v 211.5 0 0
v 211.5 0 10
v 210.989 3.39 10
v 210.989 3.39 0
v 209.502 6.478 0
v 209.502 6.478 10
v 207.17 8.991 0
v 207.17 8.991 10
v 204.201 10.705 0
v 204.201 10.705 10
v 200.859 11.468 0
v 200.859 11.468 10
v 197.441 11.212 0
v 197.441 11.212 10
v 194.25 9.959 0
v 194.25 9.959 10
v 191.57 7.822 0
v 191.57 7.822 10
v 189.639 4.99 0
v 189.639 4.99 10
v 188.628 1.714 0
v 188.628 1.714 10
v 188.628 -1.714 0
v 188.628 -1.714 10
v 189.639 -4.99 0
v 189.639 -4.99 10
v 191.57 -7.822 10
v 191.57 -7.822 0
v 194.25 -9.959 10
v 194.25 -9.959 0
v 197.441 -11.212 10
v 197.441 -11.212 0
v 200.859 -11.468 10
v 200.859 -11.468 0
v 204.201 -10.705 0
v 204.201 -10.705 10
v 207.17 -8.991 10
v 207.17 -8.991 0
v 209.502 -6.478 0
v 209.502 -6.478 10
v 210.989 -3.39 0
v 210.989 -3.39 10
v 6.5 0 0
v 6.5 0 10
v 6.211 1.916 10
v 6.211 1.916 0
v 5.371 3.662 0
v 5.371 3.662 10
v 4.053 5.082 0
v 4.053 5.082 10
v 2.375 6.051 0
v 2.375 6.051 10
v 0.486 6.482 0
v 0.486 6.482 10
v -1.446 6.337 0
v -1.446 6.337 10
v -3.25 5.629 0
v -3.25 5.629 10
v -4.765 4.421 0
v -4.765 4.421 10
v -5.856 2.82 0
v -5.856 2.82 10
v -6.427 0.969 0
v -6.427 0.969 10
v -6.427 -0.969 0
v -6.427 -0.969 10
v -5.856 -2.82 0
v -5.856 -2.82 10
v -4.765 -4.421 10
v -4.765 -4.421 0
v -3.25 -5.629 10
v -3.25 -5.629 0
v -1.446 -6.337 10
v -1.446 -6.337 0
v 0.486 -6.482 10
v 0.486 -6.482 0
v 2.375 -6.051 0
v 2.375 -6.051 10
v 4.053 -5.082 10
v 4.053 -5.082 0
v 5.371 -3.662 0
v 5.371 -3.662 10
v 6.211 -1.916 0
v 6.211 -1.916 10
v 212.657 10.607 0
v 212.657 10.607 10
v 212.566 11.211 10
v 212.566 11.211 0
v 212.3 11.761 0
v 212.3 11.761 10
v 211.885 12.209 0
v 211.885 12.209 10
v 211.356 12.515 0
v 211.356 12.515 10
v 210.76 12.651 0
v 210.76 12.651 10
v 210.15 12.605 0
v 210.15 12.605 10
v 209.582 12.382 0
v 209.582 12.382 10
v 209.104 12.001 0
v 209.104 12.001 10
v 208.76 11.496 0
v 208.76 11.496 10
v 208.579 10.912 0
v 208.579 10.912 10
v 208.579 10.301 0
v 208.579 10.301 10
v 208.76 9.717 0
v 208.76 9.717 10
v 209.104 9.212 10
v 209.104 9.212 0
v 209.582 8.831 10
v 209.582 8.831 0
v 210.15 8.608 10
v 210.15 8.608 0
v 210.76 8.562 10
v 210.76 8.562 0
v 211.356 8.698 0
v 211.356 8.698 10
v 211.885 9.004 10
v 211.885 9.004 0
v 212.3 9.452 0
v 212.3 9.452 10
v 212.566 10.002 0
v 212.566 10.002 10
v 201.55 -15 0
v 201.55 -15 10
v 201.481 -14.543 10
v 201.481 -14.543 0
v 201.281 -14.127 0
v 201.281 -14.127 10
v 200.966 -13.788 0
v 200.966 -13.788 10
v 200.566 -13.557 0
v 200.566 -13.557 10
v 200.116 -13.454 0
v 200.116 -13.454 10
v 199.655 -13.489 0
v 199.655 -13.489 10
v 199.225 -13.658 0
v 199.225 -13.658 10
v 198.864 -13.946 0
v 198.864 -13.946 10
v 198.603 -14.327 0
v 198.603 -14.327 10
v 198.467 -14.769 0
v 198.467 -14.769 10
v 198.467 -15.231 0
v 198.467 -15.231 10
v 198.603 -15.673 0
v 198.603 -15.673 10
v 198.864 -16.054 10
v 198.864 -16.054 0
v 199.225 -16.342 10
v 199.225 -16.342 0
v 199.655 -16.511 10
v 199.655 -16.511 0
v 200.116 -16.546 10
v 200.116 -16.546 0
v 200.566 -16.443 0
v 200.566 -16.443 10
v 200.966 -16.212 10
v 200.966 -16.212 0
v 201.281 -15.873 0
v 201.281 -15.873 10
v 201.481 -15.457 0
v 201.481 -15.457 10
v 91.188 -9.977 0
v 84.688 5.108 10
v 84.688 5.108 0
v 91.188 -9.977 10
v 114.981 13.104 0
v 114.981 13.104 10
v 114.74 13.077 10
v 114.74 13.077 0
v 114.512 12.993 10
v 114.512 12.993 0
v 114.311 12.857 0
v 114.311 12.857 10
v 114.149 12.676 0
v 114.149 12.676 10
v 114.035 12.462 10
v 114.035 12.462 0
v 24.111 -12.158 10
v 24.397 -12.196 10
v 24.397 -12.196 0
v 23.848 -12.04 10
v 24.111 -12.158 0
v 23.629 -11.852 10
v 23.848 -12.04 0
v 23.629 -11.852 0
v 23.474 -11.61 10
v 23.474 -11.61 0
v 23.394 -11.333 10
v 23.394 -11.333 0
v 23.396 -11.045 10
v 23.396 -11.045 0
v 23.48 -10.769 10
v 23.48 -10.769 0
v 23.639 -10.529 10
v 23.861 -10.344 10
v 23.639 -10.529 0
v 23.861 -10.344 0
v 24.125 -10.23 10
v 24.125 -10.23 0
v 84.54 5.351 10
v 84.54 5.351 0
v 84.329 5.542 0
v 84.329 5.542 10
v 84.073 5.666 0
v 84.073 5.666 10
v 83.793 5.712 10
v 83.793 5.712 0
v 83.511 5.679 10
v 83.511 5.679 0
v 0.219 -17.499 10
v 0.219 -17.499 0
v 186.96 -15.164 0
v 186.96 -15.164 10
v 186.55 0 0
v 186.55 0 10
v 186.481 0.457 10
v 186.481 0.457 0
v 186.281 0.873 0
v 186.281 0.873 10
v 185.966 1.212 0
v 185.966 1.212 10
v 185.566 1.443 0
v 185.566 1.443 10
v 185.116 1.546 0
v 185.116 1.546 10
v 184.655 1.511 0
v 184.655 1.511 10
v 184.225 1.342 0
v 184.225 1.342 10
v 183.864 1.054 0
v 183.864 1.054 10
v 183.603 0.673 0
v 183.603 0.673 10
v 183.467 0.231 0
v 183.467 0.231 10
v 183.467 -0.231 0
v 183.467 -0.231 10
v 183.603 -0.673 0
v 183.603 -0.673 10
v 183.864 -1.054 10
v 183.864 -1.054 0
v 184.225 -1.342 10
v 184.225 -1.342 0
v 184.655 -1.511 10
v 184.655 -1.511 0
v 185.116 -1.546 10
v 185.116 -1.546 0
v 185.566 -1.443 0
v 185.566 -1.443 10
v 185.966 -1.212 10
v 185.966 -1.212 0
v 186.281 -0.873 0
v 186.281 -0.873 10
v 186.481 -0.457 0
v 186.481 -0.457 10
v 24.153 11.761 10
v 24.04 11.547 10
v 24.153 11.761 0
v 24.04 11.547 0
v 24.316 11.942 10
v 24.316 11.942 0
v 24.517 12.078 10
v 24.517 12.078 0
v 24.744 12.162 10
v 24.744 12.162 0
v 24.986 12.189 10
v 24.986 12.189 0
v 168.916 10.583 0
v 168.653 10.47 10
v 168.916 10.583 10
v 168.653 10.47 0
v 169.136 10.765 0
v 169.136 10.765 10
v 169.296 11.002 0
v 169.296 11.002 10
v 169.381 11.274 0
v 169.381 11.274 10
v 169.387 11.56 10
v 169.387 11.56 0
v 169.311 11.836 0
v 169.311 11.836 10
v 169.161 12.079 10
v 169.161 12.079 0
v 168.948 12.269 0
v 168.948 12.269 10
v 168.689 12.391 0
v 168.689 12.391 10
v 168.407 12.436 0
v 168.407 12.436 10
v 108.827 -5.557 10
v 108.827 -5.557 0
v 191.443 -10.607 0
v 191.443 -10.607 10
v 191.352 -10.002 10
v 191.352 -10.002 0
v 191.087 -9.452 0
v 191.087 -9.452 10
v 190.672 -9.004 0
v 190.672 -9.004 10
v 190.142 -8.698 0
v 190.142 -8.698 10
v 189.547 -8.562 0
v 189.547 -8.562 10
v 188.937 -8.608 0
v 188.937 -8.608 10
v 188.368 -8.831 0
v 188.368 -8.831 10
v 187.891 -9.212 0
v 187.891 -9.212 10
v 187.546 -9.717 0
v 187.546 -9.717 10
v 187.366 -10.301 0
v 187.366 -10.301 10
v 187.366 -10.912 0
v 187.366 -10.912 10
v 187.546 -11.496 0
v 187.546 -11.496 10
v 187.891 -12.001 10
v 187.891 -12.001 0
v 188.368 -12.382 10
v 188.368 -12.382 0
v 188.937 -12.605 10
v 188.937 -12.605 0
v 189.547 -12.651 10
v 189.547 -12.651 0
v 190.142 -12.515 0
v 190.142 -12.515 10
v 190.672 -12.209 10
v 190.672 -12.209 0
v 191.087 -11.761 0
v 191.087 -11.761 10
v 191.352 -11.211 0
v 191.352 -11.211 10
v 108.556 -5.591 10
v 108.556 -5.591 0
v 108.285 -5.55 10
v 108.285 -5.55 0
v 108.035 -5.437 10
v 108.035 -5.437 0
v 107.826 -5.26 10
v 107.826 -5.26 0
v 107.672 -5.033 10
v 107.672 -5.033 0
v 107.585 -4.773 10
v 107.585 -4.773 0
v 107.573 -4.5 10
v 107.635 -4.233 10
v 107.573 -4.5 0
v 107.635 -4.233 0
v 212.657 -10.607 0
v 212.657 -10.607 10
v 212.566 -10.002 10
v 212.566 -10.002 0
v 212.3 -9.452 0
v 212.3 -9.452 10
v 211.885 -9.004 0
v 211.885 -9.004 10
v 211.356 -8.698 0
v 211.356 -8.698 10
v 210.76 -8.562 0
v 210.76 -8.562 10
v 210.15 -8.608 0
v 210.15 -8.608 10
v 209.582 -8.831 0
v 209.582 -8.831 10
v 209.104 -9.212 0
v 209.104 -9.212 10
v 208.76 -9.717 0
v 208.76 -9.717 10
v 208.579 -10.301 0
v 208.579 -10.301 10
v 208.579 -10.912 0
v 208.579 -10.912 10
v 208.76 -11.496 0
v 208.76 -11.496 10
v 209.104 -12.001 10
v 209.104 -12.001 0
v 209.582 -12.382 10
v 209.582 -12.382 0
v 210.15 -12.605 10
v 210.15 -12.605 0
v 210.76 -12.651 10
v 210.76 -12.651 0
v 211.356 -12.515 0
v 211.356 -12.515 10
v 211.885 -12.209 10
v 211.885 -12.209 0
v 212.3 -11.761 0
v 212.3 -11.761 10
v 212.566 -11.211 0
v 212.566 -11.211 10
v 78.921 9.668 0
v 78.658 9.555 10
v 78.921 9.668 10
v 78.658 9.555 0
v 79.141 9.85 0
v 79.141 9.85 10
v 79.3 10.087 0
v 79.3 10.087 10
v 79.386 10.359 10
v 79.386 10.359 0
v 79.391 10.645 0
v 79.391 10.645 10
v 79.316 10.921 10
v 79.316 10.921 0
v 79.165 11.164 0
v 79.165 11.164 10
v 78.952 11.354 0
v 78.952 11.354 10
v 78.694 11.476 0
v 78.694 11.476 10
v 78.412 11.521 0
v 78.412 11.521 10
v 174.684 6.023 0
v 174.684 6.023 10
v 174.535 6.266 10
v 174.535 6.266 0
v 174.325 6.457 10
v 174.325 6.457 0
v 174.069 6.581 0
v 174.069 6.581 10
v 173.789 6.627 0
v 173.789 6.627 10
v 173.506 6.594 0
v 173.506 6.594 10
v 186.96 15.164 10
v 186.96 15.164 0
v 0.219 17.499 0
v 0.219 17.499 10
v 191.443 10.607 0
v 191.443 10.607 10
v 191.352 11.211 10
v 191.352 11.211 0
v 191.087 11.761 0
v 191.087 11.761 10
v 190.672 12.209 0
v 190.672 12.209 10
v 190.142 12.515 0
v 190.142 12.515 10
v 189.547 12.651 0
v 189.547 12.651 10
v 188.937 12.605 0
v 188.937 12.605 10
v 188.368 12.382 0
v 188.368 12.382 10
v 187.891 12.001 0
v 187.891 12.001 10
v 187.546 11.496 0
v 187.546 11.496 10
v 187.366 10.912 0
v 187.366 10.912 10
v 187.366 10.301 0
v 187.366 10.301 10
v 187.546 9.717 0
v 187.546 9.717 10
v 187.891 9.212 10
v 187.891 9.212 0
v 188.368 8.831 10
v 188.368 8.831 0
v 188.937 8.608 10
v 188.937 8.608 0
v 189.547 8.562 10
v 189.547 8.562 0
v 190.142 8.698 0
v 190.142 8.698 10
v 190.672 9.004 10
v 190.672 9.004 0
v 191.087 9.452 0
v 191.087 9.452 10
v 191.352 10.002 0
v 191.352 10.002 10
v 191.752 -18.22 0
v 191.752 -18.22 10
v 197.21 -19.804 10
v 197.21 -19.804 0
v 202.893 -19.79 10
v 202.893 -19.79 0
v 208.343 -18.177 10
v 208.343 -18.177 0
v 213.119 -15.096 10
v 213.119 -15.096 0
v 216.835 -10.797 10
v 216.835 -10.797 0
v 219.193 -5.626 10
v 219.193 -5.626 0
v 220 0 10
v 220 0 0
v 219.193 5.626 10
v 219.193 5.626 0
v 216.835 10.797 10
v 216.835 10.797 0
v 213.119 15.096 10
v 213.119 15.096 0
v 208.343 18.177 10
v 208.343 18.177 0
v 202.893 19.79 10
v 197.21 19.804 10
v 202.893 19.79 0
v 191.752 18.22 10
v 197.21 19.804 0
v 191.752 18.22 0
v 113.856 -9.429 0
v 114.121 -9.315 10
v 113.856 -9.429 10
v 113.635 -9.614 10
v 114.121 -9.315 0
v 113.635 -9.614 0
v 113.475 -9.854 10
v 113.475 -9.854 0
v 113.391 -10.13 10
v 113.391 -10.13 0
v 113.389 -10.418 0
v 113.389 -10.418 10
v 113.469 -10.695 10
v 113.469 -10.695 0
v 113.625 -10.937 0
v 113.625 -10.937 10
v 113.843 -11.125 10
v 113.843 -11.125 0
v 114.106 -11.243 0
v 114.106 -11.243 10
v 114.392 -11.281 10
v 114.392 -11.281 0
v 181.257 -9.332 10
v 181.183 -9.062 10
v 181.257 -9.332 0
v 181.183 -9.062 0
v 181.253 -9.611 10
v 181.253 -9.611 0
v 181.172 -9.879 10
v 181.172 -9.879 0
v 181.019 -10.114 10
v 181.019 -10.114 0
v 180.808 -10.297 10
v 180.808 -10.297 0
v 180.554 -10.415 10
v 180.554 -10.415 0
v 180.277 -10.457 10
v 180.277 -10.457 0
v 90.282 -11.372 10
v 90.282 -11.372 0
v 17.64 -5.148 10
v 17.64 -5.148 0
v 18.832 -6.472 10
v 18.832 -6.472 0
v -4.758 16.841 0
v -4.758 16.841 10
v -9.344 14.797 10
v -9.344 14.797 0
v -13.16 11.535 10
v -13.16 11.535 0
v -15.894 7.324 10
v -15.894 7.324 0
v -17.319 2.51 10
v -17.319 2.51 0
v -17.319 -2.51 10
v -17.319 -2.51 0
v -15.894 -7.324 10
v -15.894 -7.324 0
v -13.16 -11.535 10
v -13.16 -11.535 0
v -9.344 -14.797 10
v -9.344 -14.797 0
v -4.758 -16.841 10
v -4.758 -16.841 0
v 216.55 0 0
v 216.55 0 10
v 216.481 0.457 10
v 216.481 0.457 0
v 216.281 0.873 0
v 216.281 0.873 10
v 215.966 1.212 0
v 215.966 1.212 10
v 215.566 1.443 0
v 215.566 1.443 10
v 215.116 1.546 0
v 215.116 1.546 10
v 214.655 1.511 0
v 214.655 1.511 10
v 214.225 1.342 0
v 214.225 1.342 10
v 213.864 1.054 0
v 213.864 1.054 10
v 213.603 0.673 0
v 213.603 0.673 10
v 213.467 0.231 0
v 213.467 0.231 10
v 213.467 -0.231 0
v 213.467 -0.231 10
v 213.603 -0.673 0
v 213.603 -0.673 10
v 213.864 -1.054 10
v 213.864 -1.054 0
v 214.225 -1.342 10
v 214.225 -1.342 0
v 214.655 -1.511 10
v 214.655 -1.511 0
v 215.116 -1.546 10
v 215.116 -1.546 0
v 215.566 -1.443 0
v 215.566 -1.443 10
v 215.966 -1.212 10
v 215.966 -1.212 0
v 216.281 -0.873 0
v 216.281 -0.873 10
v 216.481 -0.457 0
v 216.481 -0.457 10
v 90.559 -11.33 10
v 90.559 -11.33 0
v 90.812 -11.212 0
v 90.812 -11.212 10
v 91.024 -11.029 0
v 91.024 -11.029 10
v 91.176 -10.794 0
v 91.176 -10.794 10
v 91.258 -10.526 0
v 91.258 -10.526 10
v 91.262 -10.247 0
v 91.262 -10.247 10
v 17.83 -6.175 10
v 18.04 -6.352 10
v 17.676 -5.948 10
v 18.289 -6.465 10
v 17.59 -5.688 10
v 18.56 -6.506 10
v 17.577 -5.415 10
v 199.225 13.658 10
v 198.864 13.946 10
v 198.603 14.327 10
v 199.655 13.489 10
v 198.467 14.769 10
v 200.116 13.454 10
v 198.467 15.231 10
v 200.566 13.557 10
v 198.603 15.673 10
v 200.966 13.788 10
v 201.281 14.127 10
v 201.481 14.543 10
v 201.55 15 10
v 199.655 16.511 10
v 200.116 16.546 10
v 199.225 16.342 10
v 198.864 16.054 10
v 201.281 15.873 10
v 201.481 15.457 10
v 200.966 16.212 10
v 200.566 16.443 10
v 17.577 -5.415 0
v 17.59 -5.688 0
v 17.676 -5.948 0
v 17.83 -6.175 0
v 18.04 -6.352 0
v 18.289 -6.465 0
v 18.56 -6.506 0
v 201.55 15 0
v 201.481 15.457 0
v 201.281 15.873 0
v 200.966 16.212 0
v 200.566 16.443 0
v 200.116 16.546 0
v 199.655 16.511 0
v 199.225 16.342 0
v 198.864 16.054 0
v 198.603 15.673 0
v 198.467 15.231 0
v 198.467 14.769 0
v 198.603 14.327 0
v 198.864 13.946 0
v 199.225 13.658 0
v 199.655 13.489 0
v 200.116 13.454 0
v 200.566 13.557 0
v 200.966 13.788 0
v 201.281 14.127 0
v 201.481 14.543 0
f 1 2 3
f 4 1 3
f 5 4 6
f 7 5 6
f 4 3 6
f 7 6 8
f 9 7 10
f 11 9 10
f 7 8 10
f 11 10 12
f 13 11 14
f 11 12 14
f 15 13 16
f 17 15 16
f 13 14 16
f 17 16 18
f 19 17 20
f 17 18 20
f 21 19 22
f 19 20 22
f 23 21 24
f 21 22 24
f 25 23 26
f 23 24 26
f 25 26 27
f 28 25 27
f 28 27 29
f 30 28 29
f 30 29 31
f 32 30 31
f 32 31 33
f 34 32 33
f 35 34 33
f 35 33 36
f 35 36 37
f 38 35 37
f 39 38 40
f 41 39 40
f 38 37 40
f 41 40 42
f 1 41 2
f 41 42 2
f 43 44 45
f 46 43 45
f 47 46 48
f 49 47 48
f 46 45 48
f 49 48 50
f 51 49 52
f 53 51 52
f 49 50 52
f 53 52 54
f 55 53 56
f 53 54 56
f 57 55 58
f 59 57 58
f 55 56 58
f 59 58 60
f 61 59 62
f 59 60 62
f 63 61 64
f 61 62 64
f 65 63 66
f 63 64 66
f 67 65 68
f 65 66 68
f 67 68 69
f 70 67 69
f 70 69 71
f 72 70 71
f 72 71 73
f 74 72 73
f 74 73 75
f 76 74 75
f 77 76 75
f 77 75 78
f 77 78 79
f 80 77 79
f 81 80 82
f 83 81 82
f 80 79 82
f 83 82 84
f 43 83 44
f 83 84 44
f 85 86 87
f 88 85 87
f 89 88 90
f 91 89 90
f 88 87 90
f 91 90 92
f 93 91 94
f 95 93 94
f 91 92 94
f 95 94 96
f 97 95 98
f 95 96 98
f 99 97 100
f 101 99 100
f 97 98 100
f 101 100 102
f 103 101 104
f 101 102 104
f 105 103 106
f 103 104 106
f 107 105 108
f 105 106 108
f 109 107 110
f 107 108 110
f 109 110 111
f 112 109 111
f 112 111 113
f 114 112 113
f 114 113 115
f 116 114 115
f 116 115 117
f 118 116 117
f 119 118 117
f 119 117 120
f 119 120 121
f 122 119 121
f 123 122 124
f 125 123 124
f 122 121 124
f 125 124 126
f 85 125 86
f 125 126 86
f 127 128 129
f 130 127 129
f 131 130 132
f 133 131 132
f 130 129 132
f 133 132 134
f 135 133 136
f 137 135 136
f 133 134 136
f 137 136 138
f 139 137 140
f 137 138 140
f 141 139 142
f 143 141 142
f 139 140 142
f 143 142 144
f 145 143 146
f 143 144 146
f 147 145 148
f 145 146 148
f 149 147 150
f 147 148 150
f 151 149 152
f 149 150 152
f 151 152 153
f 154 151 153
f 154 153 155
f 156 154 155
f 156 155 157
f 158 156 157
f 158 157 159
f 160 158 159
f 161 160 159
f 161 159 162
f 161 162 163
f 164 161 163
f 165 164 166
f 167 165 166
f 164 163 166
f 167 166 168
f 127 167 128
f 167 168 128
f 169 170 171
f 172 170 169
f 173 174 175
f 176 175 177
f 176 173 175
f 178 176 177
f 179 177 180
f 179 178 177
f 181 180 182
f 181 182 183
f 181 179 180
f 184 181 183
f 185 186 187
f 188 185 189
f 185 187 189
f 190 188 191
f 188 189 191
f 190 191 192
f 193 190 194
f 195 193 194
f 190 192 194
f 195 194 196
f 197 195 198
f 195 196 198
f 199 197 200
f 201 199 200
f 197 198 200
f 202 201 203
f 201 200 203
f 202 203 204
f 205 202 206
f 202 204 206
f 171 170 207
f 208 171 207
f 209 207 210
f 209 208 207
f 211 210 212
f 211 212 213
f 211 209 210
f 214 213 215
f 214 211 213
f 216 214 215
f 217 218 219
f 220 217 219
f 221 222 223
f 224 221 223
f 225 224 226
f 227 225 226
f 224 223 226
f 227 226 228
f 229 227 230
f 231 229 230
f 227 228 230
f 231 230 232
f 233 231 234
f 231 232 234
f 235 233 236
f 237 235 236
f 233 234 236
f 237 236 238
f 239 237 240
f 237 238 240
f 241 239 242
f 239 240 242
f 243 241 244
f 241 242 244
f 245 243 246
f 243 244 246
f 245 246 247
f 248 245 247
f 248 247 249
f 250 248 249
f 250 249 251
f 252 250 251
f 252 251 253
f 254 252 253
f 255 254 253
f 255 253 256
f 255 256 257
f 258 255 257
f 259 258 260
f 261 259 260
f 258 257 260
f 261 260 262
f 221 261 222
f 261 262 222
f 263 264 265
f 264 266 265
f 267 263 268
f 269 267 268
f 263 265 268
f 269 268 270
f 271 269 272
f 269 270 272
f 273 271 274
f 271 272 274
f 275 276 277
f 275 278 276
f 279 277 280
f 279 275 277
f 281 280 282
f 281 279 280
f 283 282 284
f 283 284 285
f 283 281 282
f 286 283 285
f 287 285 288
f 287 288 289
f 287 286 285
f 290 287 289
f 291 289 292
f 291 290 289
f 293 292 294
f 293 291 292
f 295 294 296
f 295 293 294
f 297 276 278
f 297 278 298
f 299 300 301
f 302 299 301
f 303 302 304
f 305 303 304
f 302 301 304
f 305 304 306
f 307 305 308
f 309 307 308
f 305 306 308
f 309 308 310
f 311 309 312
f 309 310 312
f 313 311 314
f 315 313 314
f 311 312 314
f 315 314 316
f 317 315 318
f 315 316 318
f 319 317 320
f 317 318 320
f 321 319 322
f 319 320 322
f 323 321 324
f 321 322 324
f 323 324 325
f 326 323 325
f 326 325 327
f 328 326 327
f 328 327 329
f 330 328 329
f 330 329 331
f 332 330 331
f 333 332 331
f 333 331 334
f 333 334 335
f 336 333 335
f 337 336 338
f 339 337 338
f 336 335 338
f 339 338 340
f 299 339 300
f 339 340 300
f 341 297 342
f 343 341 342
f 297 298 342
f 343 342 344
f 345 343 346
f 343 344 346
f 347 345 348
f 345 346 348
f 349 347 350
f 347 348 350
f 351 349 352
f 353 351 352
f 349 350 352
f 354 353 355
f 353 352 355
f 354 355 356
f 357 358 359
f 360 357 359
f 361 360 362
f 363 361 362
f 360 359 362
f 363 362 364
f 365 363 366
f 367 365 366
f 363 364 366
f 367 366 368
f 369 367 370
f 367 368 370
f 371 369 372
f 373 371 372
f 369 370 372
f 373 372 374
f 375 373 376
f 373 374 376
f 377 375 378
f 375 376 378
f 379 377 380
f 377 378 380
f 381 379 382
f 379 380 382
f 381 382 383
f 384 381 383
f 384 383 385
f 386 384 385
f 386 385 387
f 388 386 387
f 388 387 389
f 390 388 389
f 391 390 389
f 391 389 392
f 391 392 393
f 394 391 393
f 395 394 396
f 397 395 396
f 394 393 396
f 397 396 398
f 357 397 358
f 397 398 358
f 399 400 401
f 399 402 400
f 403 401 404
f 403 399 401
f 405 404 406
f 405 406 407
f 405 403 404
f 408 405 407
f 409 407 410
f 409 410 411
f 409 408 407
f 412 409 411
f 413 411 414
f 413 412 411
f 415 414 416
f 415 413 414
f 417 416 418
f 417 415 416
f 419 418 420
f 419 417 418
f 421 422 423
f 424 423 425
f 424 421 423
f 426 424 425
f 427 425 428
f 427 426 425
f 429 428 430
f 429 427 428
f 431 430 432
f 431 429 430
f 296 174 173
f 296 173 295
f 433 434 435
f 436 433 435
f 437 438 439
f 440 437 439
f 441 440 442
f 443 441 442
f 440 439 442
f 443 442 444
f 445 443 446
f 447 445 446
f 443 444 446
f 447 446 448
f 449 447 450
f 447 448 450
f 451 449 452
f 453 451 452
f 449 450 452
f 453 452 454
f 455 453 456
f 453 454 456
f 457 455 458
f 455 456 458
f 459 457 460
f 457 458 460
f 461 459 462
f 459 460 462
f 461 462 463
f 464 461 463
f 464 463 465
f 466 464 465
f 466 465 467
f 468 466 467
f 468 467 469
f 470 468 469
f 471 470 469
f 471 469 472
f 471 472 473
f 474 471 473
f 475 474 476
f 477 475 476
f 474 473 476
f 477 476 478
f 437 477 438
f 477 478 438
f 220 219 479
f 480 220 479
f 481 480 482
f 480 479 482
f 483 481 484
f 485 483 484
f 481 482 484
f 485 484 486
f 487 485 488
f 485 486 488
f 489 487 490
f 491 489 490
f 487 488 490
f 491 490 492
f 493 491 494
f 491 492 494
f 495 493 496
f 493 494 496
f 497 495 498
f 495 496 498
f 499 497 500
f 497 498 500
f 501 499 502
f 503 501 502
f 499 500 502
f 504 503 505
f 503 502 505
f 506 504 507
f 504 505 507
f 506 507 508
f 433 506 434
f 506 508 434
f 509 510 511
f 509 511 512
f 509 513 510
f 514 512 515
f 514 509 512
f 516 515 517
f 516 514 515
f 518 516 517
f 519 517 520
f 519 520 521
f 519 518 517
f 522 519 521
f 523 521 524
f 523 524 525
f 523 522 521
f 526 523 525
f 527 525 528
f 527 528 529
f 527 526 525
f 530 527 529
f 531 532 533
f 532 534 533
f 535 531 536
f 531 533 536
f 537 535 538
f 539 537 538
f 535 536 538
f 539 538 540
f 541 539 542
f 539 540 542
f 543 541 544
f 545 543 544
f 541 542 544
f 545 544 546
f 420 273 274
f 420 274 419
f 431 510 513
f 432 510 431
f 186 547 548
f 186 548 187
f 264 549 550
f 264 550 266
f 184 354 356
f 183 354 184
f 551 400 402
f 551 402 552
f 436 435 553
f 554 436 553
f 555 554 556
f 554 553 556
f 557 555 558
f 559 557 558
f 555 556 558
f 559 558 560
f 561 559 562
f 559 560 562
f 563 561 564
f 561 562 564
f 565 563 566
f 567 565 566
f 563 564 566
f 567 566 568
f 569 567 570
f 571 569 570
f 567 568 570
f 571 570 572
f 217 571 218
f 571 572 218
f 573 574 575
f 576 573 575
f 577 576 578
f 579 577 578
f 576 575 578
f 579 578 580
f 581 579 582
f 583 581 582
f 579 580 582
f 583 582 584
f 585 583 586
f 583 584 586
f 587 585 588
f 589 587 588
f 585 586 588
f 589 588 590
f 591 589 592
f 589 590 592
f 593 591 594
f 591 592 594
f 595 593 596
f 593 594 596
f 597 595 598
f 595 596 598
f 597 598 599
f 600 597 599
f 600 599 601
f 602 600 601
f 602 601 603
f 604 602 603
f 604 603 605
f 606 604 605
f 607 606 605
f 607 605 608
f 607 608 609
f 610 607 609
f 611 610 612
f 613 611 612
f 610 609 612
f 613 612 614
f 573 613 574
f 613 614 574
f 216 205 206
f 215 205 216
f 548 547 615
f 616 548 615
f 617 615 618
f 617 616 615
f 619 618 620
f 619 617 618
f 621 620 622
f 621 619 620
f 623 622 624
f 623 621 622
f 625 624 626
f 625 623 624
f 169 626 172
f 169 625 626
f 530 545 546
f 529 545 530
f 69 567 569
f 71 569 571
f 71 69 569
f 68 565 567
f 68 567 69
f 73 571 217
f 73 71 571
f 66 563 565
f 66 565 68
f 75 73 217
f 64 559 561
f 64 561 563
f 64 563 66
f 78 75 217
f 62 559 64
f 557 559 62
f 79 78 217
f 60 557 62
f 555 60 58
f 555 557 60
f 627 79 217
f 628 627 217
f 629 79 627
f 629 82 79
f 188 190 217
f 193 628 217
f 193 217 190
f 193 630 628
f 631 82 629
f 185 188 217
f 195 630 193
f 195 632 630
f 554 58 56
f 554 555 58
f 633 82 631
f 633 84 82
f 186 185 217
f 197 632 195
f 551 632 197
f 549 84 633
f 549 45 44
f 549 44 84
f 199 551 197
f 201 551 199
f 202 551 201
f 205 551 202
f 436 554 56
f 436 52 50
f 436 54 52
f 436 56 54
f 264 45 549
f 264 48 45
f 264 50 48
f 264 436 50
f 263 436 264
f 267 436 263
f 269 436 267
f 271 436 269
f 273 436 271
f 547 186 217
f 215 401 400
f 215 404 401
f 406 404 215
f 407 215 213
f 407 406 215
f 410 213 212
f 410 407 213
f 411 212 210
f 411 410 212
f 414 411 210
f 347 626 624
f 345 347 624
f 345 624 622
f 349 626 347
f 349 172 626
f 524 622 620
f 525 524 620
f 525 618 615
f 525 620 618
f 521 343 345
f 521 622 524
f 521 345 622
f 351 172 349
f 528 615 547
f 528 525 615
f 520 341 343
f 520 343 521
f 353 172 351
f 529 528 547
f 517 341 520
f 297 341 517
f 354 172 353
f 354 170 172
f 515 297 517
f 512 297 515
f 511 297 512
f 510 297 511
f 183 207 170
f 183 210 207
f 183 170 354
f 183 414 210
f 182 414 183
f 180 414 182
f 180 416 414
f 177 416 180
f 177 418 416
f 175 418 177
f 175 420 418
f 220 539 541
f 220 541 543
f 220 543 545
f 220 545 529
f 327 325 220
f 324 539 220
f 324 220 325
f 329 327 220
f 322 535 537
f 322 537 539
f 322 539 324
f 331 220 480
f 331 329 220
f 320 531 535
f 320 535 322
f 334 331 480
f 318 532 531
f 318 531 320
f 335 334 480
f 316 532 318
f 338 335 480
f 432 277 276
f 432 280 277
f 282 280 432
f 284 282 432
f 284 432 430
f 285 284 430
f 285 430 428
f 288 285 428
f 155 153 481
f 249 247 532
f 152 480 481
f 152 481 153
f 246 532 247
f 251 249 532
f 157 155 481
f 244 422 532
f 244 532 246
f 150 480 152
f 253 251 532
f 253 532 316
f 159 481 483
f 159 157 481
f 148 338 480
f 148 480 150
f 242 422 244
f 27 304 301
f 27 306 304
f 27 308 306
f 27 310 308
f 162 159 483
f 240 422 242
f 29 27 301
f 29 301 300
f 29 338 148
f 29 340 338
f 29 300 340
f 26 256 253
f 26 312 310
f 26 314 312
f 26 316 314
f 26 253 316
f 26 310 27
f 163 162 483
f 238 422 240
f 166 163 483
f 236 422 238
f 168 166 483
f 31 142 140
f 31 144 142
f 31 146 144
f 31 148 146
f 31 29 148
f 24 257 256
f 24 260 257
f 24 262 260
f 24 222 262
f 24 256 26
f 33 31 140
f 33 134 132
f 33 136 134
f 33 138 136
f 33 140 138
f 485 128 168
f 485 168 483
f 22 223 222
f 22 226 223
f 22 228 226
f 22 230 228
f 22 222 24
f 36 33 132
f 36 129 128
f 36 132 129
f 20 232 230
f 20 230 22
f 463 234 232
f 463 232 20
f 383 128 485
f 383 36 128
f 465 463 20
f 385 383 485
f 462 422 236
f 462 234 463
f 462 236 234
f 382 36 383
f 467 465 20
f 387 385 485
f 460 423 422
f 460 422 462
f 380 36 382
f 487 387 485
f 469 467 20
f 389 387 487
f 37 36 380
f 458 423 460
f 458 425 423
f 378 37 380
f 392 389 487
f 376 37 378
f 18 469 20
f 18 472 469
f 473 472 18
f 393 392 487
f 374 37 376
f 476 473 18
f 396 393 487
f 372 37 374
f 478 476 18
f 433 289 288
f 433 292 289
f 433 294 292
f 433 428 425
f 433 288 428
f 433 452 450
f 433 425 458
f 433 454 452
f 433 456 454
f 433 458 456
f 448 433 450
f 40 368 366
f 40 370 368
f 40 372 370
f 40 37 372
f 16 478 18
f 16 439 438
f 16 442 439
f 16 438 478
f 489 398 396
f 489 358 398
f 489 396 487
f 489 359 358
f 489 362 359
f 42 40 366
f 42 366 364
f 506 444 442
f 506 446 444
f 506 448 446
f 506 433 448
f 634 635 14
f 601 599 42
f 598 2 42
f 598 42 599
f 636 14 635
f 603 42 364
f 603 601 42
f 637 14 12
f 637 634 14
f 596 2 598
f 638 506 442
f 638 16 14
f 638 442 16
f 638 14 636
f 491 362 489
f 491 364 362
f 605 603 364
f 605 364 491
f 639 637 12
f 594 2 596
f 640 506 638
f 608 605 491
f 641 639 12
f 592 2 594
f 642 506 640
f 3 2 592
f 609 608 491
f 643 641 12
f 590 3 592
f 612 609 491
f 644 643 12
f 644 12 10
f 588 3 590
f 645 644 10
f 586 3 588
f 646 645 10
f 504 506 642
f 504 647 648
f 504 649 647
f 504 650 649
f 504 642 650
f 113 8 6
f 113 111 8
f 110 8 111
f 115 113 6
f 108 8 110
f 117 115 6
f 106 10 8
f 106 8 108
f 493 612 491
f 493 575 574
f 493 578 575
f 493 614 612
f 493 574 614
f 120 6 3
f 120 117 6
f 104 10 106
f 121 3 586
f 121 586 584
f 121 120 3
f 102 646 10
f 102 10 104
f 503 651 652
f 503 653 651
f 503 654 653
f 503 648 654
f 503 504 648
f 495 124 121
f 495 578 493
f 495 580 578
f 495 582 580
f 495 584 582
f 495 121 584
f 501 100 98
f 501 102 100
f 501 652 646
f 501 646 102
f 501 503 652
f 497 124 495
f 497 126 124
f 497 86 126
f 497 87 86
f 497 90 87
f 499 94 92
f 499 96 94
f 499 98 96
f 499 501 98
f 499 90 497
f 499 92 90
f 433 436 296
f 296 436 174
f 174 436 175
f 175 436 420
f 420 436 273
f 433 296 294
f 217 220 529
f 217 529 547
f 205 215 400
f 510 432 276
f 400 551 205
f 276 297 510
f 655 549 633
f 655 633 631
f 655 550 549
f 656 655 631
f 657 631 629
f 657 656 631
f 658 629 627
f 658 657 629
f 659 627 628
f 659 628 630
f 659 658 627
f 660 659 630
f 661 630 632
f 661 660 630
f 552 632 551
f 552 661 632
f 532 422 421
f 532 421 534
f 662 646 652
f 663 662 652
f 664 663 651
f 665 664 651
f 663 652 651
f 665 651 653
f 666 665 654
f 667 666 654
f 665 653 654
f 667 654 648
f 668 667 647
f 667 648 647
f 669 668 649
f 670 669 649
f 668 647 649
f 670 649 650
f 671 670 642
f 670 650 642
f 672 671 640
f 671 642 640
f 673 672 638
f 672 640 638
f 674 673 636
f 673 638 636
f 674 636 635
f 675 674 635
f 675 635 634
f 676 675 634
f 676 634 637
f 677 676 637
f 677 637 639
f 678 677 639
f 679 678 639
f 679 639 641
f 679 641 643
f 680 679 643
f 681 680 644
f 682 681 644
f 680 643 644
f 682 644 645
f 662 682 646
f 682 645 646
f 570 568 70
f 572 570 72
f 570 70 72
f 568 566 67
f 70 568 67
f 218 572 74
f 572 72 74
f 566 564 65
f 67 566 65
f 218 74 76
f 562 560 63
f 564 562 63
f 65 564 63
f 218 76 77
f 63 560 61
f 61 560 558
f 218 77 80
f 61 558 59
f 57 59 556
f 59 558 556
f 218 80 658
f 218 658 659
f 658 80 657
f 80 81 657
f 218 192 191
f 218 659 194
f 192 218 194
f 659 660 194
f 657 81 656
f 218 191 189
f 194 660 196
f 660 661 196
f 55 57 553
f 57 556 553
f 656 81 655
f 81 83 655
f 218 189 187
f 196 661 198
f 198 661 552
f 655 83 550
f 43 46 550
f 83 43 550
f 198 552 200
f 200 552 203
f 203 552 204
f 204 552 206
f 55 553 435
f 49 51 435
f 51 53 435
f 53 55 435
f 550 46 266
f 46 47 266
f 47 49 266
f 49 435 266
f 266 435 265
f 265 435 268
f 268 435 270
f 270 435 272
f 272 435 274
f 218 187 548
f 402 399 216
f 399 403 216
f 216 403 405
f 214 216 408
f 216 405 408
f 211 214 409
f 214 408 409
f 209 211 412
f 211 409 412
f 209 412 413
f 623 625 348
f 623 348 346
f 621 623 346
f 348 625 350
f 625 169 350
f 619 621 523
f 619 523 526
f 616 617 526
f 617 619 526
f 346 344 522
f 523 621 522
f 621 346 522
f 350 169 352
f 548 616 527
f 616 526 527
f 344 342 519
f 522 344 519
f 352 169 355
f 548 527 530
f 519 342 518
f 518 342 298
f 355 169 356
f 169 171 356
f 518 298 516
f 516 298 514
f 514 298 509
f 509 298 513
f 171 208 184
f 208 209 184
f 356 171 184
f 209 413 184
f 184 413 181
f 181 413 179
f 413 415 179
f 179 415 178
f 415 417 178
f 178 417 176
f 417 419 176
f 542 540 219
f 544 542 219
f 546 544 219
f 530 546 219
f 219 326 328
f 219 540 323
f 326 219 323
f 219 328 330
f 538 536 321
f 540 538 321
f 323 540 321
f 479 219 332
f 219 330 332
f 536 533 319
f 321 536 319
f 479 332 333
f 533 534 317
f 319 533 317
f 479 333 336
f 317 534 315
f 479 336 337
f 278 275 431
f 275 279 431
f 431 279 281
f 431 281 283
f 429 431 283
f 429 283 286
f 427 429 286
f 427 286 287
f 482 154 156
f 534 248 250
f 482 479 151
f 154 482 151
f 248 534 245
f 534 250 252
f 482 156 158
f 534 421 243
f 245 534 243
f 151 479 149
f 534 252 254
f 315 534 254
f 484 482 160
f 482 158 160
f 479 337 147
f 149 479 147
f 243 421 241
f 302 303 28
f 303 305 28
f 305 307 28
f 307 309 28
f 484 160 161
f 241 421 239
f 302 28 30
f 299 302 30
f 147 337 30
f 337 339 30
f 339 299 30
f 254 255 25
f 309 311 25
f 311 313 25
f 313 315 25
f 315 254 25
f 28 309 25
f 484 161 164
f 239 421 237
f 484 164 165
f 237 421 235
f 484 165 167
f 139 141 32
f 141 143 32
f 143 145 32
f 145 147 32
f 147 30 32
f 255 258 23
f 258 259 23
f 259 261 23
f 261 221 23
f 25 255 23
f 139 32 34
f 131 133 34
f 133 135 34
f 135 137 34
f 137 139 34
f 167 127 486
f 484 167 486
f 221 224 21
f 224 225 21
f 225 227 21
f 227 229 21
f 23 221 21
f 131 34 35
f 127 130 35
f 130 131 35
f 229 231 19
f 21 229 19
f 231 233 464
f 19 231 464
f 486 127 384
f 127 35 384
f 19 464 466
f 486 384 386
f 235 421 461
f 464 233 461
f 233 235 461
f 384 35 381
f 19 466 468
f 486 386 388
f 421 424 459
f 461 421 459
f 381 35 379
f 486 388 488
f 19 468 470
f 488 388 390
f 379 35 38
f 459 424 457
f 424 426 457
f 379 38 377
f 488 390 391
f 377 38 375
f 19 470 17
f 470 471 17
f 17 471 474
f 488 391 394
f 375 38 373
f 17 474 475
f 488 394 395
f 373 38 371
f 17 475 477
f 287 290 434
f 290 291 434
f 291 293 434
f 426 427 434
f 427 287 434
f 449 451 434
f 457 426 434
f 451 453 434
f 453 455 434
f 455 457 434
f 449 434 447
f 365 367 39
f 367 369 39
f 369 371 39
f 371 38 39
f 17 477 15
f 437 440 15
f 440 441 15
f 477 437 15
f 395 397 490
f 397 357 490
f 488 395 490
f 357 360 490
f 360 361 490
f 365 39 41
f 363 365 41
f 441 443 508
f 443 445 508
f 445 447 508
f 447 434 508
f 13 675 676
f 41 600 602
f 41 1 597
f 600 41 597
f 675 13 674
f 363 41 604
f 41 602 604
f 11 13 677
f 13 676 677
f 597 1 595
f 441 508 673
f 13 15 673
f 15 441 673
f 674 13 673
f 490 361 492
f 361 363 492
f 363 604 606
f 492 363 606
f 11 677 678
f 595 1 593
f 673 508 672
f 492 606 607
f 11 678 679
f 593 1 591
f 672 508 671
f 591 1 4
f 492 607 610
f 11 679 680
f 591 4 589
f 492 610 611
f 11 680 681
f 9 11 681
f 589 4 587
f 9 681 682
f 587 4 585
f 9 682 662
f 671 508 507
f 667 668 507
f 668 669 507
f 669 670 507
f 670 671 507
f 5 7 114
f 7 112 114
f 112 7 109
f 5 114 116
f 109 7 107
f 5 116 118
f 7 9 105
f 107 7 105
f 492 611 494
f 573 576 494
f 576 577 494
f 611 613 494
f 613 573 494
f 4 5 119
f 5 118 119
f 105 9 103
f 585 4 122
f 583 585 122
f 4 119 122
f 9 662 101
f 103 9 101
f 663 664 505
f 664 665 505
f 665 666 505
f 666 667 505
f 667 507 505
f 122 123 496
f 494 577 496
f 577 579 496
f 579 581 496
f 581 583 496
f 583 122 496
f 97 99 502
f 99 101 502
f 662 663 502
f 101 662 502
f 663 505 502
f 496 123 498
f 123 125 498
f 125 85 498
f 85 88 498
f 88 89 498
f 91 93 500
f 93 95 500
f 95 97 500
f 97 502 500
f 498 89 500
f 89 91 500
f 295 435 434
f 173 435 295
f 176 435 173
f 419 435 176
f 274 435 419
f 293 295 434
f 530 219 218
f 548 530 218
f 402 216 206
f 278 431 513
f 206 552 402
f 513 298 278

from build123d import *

# Parameters (mm, degrees)
EXTRUDE_1_DEPTH     = 10
SKETCH_2_R          = 6.5
CUT_EXTRUDE_1_DEPTH = 10
CUT_EXTRUDE_2_DEPTH = 10
FILLET_1_R          = 1
EXTRUDE_START       = -10
EXTRUDE_2_DEPTH     = 10
SKETCH_5_R          = 1.55
SKETCH_5_R_2        = 2.05
CUT_EXTRUDE_3_DEPTH = 10
SKETCH_6_R          = 11.5
CUT_EXTRUDE_4_DEPTH = 10


with BuildPart() as part:
    # 草图1 → 凸台-拉伸1 (new body)
    with BuildSketch(Plane.XY):
        with BuildLine():
            Line((200.1875, 14.998828079), (0.21875, 17.498632759))
            ThreePointArc((0.21875, 17.498632759), (-17.5, 0), (0.21875, -17.498632759))
            Line((0.21875, -17.498632759), (200.1875, -14.998828079))
            ThreePointArc((200.1875, -14.998828079), (215, 0), (200.1875, 14.998828079))
        make_face()
    extrude(amount=EXTRUDE_1_DEPTH)

    # 草图2 → 切除-拉伸1 (cut)
    with BuildSketch(Plane.XY.offset(10)):
        Circle(SKETCH_2_R)
    extrude(amount=-CUT_EXTRUDE_1_DEPTH, mode=Mode.SUBTRACT)

    # 草图3 → 切除-拉伸2 (cut)
    with BuildSketch(Plane.XY.offset(10)):
        Polygon((24.289001935, 12.19734043), (85.658139631, 11.430166271), (16.937408094, -6.979422532), align=None)
        Polygon((16.414613885, -12.295777972), (84.346077325, 5.902373893), (91.781134838, -11.353622851), align=None)
        Polygon((106.93275646, -6.06439659), (114.284350301, 13.112366373), (175.653487997, 12.345192214), align=None)
        Polygon((181.776483204, -10.438596909), (106.409962251, -11.380752029), (174.341425691, 6.817399835), align=None)
    extrude(amount=-CUT_EXTRUDE_2_DEPTH, mode=Mode.SUBTRACT)

    # 圆角1
    fillet_1_edges = [part.edges().sort_by_distance(p)[0] for p in [
        (84.346077325, 5.902373893, 5),
        (91.781134838, -11.353622851, 5),
        (16.414613885, -12.295777972, 5),
        (175.653487997, 12.345192214, 5),
        (106.93275646, -6.06439659, 5),
        (114.284350301, 13.112366373, 5),
        (174.341425691, 6.817399835, 5),
        (181.776483204, -10.438596909, 5),
        (106.409962251, -11.380752029, 5),
        (85.658139631, 11.430166271, 5),
        (16.937408094, -6.979422532, 5),
        (24.289001935, 12.19734043, 5),
    ]]
    fillet(fillet_1_edges, radius=FILLET_1_R)

    # 草图4 → 凸台-拉伸2 (add)
    with BuildSketch(Plane.XY.offset(10).offset(EXTRUDE_START)):
        with BuildLine():
            Line((186.959776982, 15.164187536), (200.1875, 14.998828079))
            ThreePointArc((200.1875, 14.998828079), (215, 0), (200.1875, -14.998828079))
            Line((200.1875, -14.998828079), (186.959776982, -15.164187536))
            ThreePointArc((186.959776982, -15.164187536), (220, 0), (186.959776982, 15.164187536))
        make_face()
    extrude(amount=EXTRUDE_2_DEPTH)

    # 草图5 → 切除-拉伸3 (cut)
    with BuildSketch(Plane.XY.offset(10)):
        with Locations((200, 15)):
            Circle(SKETCH_5_R)
        with Locations((215, 0)):
            Circle(SKETCH_5_R)
        with Locations((200, -15)):
            Circle(SKETCH_5_R)
        with Locations((185, 0)):
            Circle(SKETCH_5_R)
        with Locations((189.393398282, 10.606601718)):
            Circle(SKETCH_5_R_2)
        with Locations((210.606601718, 10.606601718)):
            Circle(SKETCH_5_R_2)
        with Locations((210.606601718, -10.606601718)):
            Circle(SKETCH_5_R_2)
        with Locations((189.393398282, -10.606601718)):
            Circle(SKETCH_5_R_2)
    extrude(amount=-CUT_EXTRUDE_3_DEPTH, mode=Mode.SUBTRACT)

    # 草图6 → 切除-拉伸4 (cut)
    with BuildSketch(Plane.XY.offset(10)):
        with Locations((200, 0)):
            Circle(SKETCH_6_R)
    extrude(amount=-CUT_EXTRUDE_4_DEPTH, mode=Mode.SUBTRACT)


solid = part.part
